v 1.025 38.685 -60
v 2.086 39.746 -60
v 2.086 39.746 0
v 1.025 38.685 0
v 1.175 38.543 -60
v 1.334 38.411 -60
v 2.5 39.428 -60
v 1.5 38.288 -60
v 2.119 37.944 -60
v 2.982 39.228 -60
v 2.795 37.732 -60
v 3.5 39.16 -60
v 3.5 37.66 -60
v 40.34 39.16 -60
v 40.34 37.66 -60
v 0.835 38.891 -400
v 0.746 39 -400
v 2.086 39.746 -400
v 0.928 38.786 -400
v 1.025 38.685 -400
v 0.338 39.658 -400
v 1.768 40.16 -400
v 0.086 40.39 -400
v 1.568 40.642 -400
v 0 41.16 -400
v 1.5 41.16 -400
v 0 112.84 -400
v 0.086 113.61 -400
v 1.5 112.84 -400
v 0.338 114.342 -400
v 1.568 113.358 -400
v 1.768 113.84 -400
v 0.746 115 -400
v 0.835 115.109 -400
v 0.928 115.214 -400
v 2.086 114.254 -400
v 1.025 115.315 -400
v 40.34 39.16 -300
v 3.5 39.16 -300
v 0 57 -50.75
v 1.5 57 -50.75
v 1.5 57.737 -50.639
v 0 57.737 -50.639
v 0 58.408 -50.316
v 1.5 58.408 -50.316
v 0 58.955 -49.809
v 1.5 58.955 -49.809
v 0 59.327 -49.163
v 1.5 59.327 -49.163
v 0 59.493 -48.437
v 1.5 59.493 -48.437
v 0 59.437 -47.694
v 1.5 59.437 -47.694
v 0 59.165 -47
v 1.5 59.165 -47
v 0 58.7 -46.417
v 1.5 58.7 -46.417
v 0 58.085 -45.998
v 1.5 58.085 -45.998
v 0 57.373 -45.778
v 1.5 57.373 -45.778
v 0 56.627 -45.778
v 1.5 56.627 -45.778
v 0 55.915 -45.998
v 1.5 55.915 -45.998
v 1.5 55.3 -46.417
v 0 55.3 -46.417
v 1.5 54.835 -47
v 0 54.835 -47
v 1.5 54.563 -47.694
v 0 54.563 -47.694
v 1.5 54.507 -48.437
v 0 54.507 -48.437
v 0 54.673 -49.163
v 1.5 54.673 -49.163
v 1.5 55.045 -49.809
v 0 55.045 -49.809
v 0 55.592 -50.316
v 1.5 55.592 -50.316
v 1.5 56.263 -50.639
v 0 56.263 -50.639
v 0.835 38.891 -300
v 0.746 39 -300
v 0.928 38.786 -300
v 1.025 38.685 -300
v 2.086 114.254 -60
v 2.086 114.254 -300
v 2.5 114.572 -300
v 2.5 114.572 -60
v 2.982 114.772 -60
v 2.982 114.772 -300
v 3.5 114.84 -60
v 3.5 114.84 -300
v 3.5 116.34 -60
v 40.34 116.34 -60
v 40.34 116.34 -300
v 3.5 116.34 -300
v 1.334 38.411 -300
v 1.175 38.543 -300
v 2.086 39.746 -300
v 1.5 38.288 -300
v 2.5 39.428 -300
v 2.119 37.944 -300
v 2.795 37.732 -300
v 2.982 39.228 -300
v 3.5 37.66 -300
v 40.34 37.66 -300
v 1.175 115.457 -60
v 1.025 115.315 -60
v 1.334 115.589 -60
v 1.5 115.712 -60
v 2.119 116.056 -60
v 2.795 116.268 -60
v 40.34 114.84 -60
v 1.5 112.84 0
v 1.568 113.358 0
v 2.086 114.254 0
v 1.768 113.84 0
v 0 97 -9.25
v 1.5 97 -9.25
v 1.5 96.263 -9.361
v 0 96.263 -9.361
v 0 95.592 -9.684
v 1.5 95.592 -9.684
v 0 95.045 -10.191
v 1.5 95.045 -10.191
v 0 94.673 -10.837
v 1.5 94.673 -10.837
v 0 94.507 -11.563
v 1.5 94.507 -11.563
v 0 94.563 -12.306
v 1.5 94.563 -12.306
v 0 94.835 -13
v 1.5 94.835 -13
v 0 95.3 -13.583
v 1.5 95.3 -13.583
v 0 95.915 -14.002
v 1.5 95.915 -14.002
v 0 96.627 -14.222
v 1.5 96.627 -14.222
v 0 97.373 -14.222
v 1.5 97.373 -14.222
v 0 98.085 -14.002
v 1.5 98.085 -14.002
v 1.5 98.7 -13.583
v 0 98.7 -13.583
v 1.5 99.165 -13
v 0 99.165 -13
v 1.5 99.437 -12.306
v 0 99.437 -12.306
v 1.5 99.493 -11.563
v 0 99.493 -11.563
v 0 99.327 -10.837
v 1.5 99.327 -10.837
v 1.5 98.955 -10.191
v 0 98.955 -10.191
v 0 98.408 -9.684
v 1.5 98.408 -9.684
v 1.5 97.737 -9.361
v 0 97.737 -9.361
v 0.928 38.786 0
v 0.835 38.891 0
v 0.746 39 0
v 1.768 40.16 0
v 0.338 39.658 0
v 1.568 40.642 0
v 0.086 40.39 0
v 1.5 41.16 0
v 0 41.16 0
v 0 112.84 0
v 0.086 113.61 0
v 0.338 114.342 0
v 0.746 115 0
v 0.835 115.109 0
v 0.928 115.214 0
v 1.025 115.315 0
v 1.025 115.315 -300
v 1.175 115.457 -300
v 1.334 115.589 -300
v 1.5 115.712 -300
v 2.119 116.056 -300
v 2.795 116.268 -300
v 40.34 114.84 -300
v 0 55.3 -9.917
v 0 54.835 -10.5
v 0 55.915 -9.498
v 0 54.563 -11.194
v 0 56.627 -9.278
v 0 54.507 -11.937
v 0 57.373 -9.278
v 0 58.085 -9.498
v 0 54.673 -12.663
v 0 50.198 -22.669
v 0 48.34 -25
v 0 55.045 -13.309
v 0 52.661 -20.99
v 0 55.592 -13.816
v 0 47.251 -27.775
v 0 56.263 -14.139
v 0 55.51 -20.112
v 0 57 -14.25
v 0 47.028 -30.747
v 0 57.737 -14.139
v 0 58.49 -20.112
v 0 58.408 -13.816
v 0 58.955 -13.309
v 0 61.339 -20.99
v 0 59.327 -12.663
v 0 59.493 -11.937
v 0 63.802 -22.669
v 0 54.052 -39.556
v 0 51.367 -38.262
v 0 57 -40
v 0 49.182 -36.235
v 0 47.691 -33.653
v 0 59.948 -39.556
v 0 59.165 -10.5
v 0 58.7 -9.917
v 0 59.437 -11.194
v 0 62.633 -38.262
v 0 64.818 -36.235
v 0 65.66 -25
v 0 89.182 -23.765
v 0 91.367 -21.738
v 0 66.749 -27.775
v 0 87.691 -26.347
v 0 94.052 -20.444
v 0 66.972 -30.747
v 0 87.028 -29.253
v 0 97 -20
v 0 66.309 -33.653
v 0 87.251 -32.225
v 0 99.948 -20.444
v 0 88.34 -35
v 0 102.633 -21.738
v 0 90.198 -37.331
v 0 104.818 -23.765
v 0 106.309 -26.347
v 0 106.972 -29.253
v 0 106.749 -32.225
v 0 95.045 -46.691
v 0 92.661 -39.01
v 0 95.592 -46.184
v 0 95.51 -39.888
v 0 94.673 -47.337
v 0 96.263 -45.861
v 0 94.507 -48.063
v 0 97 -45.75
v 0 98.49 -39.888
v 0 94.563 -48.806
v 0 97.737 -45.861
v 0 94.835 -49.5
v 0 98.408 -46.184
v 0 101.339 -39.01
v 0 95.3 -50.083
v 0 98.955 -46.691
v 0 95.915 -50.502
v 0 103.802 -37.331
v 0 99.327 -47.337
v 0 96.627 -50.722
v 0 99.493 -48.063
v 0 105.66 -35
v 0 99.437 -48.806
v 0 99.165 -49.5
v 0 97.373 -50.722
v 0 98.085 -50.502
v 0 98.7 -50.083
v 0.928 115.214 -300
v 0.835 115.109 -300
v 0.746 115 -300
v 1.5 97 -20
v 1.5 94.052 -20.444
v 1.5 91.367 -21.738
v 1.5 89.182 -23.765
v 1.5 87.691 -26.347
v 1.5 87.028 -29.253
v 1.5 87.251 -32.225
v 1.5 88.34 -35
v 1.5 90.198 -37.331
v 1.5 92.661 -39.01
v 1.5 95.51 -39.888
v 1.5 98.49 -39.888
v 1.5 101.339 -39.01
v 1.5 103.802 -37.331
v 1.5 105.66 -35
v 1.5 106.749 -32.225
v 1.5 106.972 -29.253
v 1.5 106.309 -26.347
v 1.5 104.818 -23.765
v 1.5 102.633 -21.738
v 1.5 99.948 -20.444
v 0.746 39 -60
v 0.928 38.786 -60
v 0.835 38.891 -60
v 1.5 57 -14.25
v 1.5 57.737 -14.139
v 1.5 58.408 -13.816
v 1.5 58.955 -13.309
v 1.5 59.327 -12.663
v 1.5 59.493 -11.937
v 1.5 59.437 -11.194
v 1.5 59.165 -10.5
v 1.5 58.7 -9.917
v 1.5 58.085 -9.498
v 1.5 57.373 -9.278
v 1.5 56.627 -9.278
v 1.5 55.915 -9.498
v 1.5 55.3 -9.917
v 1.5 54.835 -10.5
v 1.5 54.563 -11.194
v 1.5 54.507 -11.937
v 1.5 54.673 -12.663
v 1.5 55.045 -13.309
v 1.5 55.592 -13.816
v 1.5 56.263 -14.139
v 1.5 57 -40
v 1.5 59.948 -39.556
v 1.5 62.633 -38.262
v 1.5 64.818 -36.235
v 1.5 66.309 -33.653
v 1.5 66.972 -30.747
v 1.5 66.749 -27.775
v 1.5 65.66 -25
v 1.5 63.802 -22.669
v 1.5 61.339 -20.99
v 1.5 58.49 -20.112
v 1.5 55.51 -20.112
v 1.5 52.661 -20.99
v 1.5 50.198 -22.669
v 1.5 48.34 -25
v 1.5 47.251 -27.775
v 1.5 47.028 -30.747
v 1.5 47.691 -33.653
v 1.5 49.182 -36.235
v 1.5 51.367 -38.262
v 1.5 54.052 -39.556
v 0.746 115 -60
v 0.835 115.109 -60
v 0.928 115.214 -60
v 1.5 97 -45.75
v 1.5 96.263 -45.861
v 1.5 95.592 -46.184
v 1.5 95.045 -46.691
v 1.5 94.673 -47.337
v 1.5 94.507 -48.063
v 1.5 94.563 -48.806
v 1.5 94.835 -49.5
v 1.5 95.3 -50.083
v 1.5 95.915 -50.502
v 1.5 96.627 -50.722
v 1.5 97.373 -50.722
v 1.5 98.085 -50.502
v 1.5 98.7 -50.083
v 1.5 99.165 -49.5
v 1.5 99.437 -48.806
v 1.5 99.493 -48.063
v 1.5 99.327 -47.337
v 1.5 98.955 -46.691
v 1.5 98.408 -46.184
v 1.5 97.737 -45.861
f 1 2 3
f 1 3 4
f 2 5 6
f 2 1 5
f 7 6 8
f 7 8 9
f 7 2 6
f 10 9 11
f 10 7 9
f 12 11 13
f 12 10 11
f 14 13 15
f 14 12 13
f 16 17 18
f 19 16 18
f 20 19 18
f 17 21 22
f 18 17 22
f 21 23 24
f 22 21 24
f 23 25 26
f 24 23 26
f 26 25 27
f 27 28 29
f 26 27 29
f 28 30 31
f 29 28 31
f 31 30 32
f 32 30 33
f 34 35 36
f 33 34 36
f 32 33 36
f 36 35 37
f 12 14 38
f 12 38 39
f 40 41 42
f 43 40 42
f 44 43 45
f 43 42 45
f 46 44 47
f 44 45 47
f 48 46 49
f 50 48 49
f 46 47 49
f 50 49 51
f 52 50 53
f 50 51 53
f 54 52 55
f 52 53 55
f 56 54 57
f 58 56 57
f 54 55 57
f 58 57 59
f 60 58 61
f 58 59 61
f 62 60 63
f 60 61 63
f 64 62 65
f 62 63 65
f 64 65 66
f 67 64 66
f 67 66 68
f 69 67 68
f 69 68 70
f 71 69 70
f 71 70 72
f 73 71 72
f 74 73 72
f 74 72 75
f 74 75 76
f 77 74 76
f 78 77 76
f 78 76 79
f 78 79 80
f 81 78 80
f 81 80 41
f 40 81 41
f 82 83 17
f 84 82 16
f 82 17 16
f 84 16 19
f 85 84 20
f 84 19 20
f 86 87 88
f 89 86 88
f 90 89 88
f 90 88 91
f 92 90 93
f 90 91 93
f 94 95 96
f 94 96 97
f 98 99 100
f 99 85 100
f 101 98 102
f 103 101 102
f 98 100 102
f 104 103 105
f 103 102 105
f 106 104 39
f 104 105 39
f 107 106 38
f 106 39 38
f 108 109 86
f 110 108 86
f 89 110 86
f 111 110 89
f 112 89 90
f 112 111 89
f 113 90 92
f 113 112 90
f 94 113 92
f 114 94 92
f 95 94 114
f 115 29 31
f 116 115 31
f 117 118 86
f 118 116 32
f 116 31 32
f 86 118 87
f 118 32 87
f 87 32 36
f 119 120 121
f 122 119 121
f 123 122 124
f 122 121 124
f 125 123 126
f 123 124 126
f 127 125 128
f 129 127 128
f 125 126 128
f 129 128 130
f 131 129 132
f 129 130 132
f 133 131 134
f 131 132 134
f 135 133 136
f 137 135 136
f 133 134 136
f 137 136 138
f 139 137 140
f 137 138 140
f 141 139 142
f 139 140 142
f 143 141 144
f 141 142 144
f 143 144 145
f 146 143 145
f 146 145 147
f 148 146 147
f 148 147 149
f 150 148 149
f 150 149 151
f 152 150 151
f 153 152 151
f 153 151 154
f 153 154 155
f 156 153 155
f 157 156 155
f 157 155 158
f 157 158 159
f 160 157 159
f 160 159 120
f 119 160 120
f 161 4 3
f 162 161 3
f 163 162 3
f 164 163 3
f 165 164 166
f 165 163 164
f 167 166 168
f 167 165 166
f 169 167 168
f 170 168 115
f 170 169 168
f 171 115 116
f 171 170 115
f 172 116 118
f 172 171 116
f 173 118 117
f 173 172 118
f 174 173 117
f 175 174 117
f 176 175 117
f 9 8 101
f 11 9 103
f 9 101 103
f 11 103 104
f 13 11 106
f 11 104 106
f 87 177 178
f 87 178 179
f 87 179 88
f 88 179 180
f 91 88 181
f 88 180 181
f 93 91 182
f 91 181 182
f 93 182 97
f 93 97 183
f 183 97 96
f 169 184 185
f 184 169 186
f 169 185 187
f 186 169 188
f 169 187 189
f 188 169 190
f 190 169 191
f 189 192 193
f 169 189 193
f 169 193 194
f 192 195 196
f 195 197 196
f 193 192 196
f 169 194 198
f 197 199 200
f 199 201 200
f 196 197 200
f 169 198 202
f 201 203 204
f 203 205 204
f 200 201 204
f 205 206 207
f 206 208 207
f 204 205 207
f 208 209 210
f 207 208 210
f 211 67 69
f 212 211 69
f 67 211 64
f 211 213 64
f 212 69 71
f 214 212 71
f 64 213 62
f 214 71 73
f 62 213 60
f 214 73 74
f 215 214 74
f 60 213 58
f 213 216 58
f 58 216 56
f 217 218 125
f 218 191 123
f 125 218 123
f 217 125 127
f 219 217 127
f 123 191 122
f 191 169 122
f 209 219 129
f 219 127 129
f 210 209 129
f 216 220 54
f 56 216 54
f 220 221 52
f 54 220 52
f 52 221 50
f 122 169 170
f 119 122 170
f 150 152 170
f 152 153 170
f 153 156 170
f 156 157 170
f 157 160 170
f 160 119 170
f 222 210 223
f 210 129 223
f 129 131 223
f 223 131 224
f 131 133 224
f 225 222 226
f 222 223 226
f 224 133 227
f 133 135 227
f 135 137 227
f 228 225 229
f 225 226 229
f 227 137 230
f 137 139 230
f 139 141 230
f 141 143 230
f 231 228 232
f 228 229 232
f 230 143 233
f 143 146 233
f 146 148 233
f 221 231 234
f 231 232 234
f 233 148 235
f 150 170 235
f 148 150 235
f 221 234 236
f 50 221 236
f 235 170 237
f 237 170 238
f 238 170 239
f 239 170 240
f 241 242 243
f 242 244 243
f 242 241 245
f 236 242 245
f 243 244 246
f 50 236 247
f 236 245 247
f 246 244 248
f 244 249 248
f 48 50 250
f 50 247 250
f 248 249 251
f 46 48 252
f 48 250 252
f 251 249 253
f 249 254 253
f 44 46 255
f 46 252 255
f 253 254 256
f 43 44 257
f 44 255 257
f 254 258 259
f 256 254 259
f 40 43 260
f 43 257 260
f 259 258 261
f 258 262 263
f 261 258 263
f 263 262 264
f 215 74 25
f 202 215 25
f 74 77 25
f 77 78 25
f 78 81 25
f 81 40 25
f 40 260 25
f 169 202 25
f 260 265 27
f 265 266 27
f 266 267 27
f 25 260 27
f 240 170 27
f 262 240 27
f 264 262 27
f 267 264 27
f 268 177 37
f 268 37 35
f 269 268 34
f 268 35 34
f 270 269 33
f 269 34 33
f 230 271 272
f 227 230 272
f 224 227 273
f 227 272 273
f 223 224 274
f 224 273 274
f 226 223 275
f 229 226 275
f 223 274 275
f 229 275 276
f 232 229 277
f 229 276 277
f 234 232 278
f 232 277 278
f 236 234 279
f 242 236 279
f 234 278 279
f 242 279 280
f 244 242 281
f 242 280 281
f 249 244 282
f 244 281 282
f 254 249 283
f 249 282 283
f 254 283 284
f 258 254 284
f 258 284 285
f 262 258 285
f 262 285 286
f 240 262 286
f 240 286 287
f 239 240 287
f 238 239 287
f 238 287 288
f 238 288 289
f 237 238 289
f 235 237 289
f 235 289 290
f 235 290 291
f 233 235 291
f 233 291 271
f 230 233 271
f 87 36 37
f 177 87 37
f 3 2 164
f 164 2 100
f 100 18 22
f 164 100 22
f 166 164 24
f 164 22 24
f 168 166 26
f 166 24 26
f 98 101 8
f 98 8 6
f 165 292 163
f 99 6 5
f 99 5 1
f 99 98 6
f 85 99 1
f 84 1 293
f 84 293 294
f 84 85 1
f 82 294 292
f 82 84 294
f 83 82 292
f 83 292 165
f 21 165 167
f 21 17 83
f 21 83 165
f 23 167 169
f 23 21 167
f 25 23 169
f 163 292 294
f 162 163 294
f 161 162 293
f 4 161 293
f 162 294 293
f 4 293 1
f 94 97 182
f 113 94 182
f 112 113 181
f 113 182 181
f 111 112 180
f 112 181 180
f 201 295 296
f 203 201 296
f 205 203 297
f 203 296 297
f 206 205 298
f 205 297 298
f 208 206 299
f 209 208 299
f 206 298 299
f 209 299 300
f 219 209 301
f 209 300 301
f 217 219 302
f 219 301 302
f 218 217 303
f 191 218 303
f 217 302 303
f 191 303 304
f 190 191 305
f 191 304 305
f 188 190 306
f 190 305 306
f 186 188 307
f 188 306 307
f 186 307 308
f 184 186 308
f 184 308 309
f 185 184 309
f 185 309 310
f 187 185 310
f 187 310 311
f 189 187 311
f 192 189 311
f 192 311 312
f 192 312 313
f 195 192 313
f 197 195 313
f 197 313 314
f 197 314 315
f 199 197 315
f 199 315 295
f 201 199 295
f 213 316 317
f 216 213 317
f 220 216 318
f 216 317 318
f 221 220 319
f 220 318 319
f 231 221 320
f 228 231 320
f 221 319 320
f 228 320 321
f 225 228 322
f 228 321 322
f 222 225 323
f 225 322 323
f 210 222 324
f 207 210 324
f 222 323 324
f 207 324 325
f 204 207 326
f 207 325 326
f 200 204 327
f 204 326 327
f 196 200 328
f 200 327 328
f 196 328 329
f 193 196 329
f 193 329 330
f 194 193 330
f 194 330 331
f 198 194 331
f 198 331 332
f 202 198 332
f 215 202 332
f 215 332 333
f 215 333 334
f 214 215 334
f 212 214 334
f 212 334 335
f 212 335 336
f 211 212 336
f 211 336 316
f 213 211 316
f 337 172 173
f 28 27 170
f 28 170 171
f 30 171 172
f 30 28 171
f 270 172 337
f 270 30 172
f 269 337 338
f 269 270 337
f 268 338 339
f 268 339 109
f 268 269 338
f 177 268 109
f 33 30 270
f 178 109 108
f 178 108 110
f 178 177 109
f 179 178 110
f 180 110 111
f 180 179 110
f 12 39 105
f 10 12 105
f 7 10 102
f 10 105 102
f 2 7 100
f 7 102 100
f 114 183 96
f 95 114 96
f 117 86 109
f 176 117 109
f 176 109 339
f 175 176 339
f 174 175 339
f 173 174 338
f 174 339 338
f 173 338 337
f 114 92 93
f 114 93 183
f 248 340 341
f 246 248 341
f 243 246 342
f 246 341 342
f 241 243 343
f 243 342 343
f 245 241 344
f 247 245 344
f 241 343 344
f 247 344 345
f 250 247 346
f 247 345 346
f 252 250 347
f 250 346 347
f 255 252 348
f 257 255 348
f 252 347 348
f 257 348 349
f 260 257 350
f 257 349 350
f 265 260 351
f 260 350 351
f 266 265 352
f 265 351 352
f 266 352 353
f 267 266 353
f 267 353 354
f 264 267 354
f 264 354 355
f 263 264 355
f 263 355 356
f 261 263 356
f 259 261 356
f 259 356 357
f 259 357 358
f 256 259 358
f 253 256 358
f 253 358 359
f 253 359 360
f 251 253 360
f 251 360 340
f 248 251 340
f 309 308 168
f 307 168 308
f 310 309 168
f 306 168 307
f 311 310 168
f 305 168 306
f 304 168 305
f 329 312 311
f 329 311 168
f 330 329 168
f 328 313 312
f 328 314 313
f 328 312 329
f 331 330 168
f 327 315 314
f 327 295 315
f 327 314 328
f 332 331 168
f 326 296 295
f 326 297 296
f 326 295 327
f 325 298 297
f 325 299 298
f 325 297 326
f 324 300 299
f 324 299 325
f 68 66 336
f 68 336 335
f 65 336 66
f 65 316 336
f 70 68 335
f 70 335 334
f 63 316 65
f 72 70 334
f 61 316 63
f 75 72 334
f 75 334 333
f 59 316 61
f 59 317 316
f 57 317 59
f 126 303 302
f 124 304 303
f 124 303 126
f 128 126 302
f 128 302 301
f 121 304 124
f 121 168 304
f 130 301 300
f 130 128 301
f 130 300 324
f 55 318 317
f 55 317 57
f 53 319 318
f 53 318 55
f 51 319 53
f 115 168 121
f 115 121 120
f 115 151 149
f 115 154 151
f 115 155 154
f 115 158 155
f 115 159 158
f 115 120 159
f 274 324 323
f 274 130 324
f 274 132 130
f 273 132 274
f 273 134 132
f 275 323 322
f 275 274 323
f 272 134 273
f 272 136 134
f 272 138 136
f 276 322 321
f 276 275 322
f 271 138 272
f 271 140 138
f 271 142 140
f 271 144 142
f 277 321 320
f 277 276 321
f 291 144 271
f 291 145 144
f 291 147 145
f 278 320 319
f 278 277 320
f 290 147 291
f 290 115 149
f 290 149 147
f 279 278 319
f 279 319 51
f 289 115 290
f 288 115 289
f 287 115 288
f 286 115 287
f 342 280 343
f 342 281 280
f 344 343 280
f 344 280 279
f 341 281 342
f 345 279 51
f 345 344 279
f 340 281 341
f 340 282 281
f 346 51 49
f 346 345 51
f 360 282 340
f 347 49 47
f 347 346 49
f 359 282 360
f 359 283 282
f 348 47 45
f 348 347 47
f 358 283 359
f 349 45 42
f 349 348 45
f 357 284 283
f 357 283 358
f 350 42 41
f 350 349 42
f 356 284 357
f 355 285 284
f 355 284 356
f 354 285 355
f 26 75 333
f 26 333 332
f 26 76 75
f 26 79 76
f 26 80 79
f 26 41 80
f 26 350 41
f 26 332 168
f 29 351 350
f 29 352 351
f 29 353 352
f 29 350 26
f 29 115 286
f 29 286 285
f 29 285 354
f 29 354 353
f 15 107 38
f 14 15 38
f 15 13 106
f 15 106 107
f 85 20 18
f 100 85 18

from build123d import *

# Parameters (mm, degrees)
ESBO_O3_W                = 400
ESBO_O3_H                = 154
RESSALTO_EXTRUS_O1_DEPTH = 1.5
ESBO_O10_W               = 60
ESBO_O10_H               = 39
ESBO_O10_W_2             = 100
CORTE_EXTRUS_O1_DEPTH    = 429.623669435
ESBO_O11_R               = 10
ESBO_O11_R_2             = 2.5
CORTE_EXTRUS_O2_DEPTH    = 429.623669435
DOBRA_START              = -400
DOBRA_ESBO_ADA1_DEPTH    = 400
DOBRA_ESBO_ADA1_2_DEPTH  = 100
DOBRA_START_2            = -60
DOBRA_ESBO_ADA1_3_DEPTH  = 60
DOBRA_START_3            = -300
DOBRA_ESBO_ADA1_4_DEPTH  = 240
DOBRA_ESBO_ADA1_5_DEPTH  = 400
DOBRA_ESBO_ADA2_DEPTH    = 400
DOBRA_ESBO_ADA2_2_DEPTH  = 100
DOBRA_ESBO_ADA2_3_DEPTH  = 60
DOBRA_ESBO_ADA2_4_DEPTH  = 240
DOBRA_ESBO_ADA2_5_DEPTH  = 400


# Read off the part's stored shape, not the designer's step: Transforma__o de esbo_o2, Dobra esbo_ada2
with BuildPart() as part:
    # Esboço3 → Ressalto-extrusão1 (new body)
    with BuildSketch(Plane(origin=(0, 0, 0), x_dir=(0, 0, -1), z_dir=(1, 0, 0))):
        with Locations((200, 77)):
            Rectangle(ESBO_O3_W, ESBO_O3_H)
    extrude(amount=RESSALTO_EXTRUS_O1_DEPTH)

    # Esboço10 → Corte-extrusão1 (cut, through all)
    with BuildSketch(Plane.ZY):
        with Locations((-30, 134.5)):
            Rectangle(ESBO_O10_W, ESBO_O10_H)
        with Locations((-350, 134.5)):
            Rectangle(ESBO_O10_W_2, ESBO_O10_H)
        with Locations((-350, 19.5)):
            Rectangle(ESBO_O10_W_2, ESBO_O10_H)
        with Locations((-30, 19.5)):
            Rectangle(ESBO_O10_W, ESBO_O10_H)
    extrude(amount=-CORTE_EXTRUS_O1_DEPTH, mode=Mode.SUBTRACT)

    # Esboço11 → Corte-extrusão2 (cut, through all)
    with BuildSketch(Plane(origin=(1.5, 0, 0), x_dir=(0, 0, -1), z_dir=(1, 0, 0))):
        with Locations((30, 57)):
            Circle(ESBO_O11_R)
        with Locations(Location((30, 97, 0), (0, 0, 180))):
            Circle(ESBO_O11_R)
        with Locations((11.75, 57)):
            Circle(ESBO_O11_R_2)
        with Locations((48.25, 57)):
            Circle(ESBO_O11_R_2)
        with Locations(Location((48.25, 97, 0), (0, 0, 180))):
            Circle(ESBO_O11_R_2)
        with Locations(Location((11.75, 97, 0), (0, 0, 180))):
            Circle(ESBO_O11_R_2)
    extrude(amount=-CORTE_EXTRUS_O2_DEPTH, mode=Mode.SUBTRACT)

    # Dobra esboçada1 outline → Dobra esboçada1 (cut)
    with BuildSketch(Plane.XY.offset(DOBRA_START)):
        with BuildLine():
            Line((1.5, 0), (1.5, 38.287563626))
            ThreePointArc((1.5, 38.287563626), (0.397581589, 39.539659775), (0, 41.159844949))
            Line((0, 41.159844949), (0, 0))
            Line((0, 0), (1.5, 0))
        make_face()
    extrude(amount=DOBRA_ESBO_ADA1_DEPTH, mode=Mode.SUBTRACT)

    # Dobra esbo_ada1 2 outline → Dobra esbo_ada1 2 (cut)
    with BuildSketch(Plane.XY.offset(DOBRA_START)):
        Polygon((1.5, 39), (1.5, 39.159844949), (1.340155051, 39), align=None)
    extrude(amount=DOBRA_ESBO_ADA1_2_DEPTH, mode=Mode.SUBTRACT)

    # Dobra esbo_ada1 3 outline → Dobra esbo_ada1 3 (cut)
    with BuildSketch(Plane.XY.offset(DOBRA_START_2)):
        Polygon((1.5, 39), (1.5, 39.159844949), (1.340155051, 39), align=None)
    extrude(amount=DOBRA_ESBO_ADA1_3_DEPTH, mode=Mode.SUBTRACT)

    # Dobra esbo_ada1 4 outline → Dobra esbo_ada1 4 (add)
    with BuildSketch(Plane.XY.offset(DOBRA_START_3)):
        with BuildLine():
            Line((40.340155051, 39.159844949), (3.5, 39.159844949))
            ThreePointArc((3.5, 39.159844949), (2.085786438, 39.745631387), (1.5, 41.159844949))
            Line((1.5, 41.159844949), (1.5, 38.287563626))
            ThreePointArc((1.5, 38.287563626), (2.451902827, 37.820459929), (3.5, 37.659844949))
            Line((3.5, 37.659844949), (40.340155051, 37.659844949))
            Line((40.340155051, 37.659844949), (40.340155051, 39.159844949))
        make_face()
    extrude(amount=DOBRA_ESBO_ADA1_4_DEPTH)

    # Dobra esbo_ada1 5 outline → Dobra esbo_ada1 5 (add)
    with BuildSketch(Plane.XY.offset(DOBRA_START)):
        with BuildLine():
            Line((1.5, 39.159844949), (2.085786438, 39.745631387))
            ThreePointArc((2.085786438, 39.745631387), (1.652240935, 40.394478084), (1.5, 41.159844949))
            Line((1.5, 41.159844949), (1.5, 39.159844949))
        make_face()
        with BuildLine():
            Line((1.025126266, 38.684971215), (1.340155051, 39))
            Line((1.340155051, 39), (0.745899458, 39))
            ThreePointArc((0.745899458, 39), (0.880772294, 38.838283789), (1.025126266, 38.684971215))
        make_face()
    extrude(amount=DOBRA_ESBO_ADA1_5_DEPTH)

    # Dobra esboçada2 outline → Dobra esboçada2 (cut)
    with BuildSketch(Plane.XY.offset(DOBRA_START)):
        with BuildLine():
            Line((1.5, 115.712436374), (1.5, 154))
            Line((1.5, 154), (0, 154))
            Line((0, 154), (0, 112.840155051))
            ThreePointArc((0, 112.840155051), (0.397581589, 114.460340225), (1.5, 115.712436374))
        make_face()
    extrude(amount=DOBRA_ESBO_ADA2_DEPTH, mode=Mode.SUBTRACT)

    # Dobra esbo_ada2 2 outline → Dobra esbo_ada2 2 (cut)
    with BuildSketch(Plane.XY.offset(DOBRA_START)):
        Polygon((1.5, 114.840155051), (1.5, 115), (1.340155051, 115), align=None)
    extrude(amount=DOBRA_ESBO_ADA2_2_DEPTH, mode=Mode.SUBTRACT)

    # Dobra esbo_ada2 3 outline → Dobra esbo_ada2 3 (cut)
    with BuildSketch(Plane.XY.offset(DOBRA_START_2)):
        Polygon((1.5, 114.840155051), (1.5, 115), (1.340155051, 115), align=None)
    extrude(amount=DOBRA_ESBO_ADA2_3_DEPTH, mode=Mode.SUBTRACT)

    # Dobra esbo_ada2 4 outline → Dobra esbo_ada2 4 (add)
    with BuildSketch(Plane.XY.offset(DOBRA_START_3)):
        with BuildLine():
            Line((40.340155051, 114.840155051), (40.340155051, 116.340155051))
            Line((40.340155051, 116.340155051), (3.5, 116.340155051))
            ThreePointArc((3.5, 116.340155051), (2.451902827, 116.179540071), (1.5, 115.712436374))
            Line((1.5, 115.712436374), (1.5, 112.840155051))
            ThreePointArc((1.5, 112.840155051), (2.085786438, 114.254368613), (3.5, 114.840155051))
            Line((3.5, 114.840155051), (40.340155051, 114.840155051))
        make_face()
    extrude(amount=DOBRA_ESBO_ADA2_4_DEPTH)

    # Dobra esbo_ada2 5 outline → Dobra esbo_ada2 5 (add)
    with BuildSketch(Plane.XY.offset(DOBRA_START)):
        with BuildLine():
            ThreePointArc((1.5, 112.840155051), (1.652240935, 113.605521916), (2.085786438, 114.254368613))
            Line((2.085786438, 114.254368613), (1.5, 114.840155051))
            Line((1.5, 114.840155051), (1.5, 112.840155051))
        make_face()
        with BuildLine():
            Line((1.340155051, 115), (1.025126266, 115.315028785))
            ThreePointArc((1.025126266, 115.315028785), (0.880772294, 115.161716211), (0.745899458, 115))
            Line((0.745899458, 115), (1.340155051, 115))
        make_face()
    extrude(amount=DOBRA_ESBO_ADA2_5_DEPTH)


solid = part.part
